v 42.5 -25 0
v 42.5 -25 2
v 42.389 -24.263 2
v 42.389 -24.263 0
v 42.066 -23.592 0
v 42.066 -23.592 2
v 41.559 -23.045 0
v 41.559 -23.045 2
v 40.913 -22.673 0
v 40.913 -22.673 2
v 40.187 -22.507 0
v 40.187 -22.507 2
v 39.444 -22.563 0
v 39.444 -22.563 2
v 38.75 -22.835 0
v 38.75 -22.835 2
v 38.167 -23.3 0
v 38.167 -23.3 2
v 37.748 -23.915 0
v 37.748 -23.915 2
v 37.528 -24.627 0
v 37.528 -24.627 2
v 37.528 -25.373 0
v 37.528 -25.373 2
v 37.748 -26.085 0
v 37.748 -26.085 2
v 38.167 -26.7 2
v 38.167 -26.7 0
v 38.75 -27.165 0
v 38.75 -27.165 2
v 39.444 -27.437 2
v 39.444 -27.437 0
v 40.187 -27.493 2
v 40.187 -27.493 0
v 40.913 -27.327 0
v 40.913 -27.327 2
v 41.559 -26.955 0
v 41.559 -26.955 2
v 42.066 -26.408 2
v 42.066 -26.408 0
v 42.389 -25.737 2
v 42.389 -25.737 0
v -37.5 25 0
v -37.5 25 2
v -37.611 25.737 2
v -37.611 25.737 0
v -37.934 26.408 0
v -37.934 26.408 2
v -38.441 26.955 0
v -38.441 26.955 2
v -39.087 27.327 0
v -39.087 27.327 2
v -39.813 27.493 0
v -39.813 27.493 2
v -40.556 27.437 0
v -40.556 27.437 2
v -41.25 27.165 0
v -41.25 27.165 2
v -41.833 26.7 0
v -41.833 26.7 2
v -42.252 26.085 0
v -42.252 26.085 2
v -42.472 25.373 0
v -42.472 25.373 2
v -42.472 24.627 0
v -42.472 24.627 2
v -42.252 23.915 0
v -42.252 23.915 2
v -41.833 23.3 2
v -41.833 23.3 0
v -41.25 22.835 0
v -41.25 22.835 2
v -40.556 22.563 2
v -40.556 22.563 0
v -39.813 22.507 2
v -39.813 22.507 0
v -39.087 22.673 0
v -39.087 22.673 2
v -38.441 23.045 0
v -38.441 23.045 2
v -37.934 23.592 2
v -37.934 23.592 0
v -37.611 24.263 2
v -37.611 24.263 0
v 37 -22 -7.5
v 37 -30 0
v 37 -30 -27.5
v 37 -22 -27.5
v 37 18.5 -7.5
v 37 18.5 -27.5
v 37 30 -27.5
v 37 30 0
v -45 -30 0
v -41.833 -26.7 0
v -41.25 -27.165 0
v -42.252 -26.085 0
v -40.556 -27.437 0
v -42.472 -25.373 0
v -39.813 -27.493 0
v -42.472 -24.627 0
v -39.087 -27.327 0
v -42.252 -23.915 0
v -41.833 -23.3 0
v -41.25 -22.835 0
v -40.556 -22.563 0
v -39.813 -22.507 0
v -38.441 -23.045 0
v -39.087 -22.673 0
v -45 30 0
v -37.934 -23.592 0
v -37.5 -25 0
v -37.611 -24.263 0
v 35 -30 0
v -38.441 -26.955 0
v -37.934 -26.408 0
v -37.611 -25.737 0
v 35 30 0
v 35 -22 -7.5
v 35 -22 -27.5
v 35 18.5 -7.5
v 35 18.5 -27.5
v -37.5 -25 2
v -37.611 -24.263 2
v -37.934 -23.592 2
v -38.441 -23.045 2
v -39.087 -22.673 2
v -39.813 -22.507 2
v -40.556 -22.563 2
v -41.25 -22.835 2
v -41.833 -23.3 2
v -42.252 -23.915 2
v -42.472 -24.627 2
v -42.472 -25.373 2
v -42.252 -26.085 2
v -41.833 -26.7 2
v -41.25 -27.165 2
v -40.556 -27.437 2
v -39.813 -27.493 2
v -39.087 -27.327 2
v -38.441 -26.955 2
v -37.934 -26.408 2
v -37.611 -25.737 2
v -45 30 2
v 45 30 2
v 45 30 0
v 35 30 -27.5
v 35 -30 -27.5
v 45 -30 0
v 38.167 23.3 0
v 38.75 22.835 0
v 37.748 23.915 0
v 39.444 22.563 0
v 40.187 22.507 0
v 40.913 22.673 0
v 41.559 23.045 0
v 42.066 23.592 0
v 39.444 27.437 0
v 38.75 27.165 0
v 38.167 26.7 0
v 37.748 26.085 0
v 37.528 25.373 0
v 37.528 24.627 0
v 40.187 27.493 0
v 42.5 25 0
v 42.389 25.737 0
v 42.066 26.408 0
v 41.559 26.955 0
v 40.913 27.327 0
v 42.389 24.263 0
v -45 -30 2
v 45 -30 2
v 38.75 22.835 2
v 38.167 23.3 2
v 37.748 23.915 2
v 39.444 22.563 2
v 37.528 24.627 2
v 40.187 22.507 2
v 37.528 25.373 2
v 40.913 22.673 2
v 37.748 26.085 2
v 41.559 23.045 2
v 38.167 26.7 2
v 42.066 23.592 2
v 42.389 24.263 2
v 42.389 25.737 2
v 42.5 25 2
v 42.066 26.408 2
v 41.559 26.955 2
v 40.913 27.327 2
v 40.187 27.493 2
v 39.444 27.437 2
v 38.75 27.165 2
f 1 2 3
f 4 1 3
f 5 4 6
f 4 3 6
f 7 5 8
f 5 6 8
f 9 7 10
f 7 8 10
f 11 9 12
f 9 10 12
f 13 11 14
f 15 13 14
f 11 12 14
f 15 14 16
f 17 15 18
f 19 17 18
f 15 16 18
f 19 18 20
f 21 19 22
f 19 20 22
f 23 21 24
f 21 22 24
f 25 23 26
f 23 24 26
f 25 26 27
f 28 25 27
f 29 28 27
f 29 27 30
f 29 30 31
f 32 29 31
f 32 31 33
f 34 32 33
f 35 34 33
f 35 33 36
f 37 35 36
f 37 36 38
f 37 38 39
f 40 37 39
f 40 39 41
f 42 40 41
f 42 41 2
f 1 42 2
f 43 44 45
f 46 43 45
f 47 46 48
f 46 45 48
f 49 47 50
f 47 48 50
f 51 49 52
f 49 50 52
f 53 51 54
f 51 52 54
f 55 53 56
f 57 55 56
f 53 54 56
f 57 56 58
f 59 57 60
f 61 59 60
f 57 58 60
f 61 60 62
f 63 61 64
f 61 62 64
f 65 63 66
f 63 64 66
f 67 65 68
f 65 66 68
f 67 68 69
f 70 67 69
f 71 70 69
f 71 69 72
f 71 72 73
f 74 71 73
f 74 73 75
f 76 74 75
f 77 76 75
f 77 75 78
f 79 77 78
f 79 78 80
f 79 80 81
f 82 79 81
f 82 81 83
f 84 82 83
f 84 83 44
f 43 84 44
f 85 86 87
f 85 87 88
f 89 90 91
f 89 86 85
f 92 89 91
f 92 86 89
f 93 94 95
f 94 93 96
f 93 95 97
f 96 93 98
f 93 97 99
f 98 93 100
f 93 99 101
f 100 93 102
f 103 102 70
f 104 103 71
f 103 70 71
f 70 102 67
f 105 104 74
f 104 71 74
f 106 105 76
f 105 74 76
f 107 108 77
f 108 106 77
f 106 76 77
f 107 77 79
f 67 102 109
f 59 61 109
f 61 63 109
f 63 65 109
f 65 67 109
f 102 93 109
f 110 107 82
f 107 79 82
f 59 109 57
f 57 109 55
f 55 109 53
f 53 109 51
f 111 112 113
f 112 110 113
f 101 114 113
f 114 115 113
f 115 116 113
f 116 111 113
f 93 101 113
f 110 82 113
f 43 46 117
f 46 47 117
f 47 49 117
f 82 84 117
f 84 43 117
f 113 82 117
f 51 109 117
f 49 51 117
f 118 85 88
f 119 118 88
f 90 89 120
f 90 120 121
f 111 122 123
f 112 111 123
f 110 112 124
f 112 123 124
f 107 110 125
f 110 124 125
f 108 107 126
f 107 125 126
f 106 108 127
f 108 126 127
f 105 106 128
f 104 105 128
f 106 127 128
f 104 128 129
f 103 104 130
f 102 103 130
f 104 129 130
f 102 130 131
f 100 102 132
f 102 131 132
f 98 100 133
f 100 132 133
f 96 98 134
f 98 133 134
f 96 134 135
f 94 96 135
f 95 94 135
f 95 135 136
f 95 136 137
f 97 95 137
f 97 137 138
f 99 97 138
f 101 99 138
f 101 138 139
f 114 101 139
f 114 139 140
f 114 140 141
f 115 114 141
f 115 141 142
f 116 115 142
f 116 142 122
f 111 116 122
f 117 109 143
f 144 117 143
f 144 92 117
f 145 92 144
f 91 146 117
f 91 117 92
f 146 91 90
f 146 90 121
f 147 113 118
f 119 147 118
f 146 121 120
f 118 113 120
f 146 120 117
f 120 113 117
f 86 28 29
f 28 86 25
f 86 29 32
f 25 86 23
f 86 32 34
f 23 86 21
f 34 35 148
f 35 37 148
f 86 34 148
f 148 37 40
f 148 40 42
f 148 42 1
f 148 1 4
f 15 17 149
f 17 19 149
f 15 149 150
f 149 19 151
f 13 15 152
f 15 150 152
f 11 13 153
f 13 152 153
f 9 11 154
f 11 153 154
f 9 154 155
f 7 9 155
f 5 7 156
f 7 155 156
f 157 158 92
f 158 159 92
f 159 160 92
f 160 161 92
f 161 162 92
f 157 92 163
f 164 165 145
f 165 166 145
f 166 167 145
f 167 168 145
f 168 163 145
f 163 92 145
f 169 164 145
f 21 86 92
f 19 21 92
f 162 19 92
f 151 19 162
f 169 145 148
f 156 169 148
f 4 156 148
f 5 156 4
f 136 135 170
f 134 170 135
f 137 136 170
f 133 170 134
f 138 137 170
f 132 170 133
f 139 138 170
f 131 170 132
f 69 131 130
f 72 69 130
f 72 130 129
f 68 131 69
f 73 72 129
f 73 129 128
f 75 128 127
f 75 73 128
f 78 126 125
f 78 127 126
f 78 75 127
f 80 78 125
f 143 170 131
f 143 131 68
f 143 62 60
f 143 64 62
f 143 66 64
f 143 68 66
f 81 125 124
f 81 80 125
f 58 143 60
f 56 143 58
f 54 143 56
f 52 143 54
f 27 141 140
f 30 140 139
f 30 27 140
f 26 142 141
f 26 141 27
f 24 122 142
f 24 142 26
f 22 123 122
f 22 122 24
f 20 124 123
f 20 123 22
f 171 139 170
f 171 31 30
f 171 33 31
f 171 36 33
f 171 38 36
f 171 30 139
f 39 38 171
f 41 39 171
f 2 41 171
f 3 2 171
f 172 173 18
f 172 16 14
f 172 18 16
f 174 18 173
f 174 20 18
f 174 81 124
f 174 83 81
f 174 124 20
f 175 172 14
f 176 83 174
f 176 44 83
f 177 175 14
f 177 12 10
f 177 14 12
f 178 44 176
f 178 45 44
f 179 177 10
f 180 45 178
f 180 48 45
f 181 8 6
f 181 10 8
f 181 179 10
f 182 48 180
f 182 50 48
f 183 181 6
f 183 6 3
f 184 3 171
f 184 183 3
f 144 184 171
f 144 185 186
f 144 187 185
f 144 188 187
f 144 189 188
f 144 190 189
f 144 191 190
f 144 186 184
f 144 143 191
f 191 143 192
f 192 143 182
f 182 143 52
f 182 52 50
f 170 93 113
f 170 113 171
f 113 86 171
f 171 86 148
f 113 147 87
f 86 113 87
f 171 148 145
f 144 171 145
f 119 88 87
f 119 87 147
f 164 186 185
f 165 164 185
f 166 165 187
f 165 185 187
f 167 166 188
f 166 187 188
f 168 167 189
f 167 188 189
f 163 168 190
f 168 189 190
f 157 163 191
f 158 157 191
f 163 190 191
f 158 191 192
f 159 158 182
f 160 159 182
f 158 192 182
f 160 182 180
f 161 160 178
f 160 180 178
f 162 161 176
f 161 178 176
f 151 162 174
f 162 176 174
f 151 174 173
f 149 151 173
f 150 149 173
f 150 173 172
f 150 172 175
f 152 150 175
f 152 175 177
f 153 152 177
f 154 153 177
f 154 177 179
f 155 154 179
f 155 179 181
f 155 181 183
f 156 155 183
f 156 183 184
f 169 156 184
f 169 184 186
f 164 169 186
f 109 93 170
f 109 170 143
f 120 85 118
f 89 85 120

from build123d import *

# Parameters (mm, degrees)
SKETCH1_W           = 90
SKETCH1_H           = 60
BOSS_EXTRUDE1_DEPTH = 2
SKETCH2_R           = 2.5
CUT_EXTRUDE1_DEPTH  = 10
SKETCH3_W           = 2
SKETCH3_H           = 60
BOSS_EXTRUDE4_DEPTH = 27.5
SKETCH4_W           = 20
SKETCH4_H           = 40.5
CUT_EXTRUDE2_DEPTH  = 10


with BuildPart() as part:
    # Sketch1 → Boss-Extrude1 (new body)
    with BuildSketch(Plane.XY):
        Rectangle(SKETCH1_W, SKETCH1_H)
    extrude(amount=BOSS_EXTRUDE1_DEPTH)

    # Sketch2 → Cut-Extrude1 (cut)
    with BuildSketch(Plane.XY.offset(2)):
        with Locations((-40, -25)):
            Circle(SKETCH2_R)
        with Locations((-40, 25)):
            Circle(SKETCH2_R)
        with Locations((40, 25)):
            Circle(SKETCH2_R)
        with Locations((40, -25)):
            Circle(SKETCH2_R)
    extrude(amount=-CUT_EXTRUDE1_DEPTH, mode=Mode.SUBTRACT)

    # Sketch3 → Boss-Extrude4 (add)
    with BuildSketch(Plane(origin=(0, 0, 0), x_dir=(-1, 0, 0), z_dir=(0, 0, -1))):
        with Locations((-36, 0)):
            Rectangle(SKETCH3_W, SKETCH3_H)
    extrude(amount=BOSS_EXTRUDE4_DEPTH)

    # Sketch4 → Cut-Extrude2 (cut)
    with BuildSketch(Plane(origin=(37, 0, 0), x_dir=(0, 0, -1), z_dir=(1, 0, 0))):
        with Locations((17.5, -1.75)):
            Rectangle(SKETCH4_W, SKETCH4_H)
    extrude(amount=-CUT_EXTRUDE2_DEPTH, mode=Mode.SUBTRACT)


solid = part.part
